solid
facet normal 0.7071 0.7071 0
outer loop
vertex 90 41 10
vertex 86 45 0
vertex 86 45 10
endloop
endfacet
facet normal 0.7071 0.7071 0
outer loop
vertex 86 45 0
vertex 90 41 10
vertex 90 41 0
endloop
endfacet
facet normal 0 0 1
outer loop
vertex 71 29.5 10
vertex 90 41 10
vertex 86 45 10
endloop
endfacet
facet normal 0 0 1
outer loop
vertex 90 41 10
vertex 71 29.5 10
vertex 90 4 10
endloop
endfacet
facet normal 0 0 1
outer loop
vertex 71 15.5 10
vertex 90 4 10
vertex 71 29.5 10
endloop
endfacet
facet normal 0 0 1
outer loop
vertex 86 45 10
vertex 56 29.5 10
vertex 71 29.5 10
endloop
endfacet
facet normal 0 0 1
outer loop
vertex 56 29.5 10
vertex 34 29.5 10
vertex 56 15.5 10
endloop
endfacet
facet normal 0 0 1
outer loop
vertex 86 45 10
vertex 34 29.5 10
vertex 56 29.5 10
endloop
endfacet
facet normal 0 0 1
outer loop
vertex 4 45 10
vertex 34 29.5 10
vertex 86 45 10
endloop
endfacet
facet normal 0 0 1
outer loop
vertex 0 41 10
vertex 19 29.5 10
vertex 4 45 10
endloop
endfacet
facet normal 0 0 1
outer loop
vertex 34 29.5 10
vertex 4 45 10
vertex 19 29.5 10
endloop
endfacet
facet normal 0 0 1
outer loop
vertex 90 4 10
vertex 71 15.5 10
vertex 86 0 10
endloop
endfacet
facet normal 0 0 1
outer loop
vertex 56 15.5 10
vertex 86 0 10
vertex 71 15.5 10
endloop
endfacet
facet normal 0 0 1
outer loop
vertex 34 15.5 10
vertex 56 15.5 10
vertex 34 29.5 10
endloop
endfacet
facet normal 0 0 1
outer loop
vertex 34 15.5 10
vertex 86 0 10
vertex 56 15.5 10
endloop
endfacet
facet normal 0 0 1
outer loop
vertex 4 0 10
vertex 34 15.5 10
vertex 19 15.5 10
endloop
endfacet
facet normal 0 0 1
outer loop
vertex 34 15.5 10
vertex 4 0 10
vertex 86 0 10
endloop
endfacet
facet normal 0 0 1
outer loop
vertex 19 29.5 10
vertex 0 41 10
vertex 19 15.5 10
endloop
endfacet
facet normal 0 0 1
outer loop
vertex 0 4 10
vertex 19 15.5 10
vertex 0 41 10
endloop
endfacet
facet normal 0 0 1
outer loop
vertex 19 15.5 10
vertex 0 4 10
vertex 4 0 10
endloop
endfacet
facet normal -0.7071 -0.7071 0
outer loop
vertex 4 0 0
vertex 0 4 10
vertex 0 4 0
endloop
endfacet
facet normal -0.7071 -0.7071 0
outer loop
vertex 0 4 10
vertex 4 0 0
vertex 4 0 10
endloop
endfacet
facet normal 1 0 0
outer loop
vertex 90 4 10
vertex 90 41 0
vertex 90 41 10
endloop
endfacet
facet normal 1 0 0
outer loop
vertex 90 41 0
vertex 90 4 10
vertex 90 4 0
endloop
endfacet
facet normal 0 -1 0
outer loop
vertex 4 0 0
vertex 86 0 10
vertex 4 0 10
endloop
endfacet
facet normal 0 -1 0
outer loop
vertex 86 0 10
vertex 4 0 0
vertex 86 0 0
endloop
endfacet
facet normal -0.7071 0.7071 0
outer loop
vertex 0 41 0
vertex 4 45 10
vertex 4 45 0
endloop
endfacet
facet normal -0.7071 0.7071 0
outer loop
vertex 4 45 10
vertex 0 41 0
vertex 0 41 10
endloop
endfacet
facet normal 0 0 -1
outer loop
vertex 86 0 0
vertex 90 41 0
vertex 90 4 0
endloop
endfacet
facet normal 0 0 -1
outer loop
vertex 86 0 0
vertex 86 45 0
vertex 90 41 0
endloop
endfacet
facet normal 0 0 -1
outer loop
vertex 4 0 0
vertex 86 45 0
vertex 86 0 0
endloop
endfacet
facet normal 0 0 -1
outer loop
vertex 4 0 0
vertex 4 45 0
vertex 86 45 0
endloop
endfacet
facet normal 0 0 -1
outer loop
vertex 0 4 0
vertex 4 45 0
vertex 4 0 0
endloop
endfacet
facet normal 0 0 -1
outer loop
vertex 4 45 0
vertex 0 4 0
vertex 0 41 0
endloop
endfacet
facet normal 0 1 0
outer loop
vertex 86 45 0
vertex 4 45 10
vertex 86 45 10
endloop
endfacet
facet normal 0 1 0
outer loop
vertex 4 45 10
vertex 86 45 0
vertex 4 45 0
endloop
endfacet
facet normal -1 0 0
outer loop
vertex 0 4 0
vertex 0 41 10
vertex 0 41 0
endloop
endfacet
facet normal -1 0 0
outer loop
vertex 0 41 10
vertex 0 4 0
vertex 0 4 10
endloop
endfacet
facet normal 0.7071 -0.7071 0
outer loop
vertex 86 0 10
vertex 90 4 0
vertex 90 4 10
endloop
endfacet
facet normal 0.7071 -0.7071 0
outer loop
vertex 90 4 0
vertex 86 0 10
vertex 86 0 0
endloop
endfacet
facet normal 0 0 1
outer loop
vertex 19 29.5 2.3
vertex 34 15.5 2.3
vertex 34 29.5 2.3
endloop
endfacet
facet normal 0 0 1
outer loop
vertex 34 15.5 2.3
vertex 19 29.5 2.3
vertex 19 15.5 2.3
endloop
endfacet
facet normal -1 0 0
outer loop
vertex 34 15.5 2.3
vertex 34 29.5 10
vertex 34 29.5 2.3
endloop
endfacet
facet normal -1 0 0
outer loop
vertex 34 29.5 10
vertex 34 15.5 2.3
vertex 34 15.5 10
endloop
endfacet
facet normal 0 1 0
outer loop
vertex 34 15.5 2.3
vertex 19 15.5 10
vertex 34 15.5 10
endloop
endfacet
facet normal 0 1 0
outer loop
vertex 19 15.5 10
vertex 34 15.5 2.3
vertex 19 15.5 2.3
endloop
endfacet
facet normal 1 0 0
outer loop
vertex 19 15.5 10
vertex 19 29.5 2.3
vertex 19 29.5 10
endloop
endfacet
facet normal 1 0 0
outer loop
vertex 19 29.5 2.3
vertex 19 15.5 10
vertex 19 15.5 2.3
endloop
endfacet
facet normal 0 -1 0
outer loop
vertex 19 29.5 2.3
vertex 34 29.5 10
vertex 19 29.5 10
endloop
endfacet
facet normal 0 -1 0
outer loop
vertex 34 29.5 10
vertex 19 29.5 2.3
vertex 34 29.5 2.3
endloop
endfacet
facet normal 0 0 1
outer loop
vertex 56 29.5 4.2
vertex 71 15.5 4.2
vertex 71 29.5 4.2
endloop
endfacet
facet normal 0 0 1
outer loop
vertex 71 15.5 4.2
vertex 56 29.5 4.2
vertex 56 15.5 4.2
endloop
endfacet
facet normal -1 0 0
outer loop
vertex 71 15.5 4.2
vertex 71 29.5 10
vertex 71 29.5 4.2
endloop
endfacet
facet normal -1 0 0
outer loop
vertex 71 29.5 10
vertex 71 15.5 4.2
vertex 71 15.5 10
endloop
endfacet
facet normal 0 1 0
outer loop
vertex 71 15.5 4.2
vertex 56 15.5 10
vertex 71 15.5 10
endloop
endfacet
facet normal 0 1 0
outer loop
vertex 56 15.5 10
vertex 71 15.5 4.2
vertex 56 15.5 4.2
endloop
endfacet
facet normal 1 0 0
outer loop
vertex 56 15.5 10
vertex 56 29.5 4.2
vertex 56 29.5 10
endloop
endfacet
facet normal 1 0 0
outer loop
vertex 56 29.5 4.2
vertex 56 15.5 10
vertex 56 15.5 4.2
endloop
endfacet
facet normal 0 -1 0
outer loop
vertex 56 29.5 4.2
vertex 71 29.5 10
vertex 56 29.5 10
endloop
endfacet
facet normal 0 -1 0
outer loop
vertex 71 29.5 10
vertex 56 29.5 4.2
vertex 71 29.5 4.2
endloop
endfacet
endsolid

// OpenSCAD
$fn = 32;

// ----------------------------------------------------------------------
// Windowed plate: 2 voids, 90 x 45 x 10 mm
// ----------------------------------------------------------------------

// --- parameters (mm) ---
plate_l = 90;             // plate length, X
plate_w = 45;             // plate width, Y
plate_t = 10;             // plate thickness, Z
edge_margin = 8;          // wall from the plate edge to any window
windows = 2;              // number of windows in the row
win_l = 15;               // window length
win_w = 14;               // window width
win_pitch = 37;           // window pitch along X
depth_1 = 7.7;            // depth of void 1 (full thickness = through)
depth_2 = 5.8;            // depth of void 2 (full thickness = through)
corner_c = 4;             // corner chamfer of the plate

profile = [[4, 0], [86, 0], [90, 4], [90, 41], [86, 45], [4, 45], [0, 41], [0, 4]];  // primary outline, 8 points, counter clockwise
void_1 = [[19, 15.5], [34, 15.5], [34, 29.5], [19, 29.5]];  // window 1 of the row, 4 points
void_2 = [[56, 15.5], [71, 15.5], [71, 29.5], [56, 29.5]];  // window 2 of the row, 4 points

// --- the one profile operation ---
difference() {
  linear_extrude(height = plate_t) polygon(points = profile);
  translate([0, 0, plate_t - depth_1])
    linear_extrude(height = depth_1 + 1) polygon(points = void_1);
  translate([0, 0, plate_t - depth_2])
    linear_extrude(height = depth_2 + 1) polygon(points = void_2);
}
